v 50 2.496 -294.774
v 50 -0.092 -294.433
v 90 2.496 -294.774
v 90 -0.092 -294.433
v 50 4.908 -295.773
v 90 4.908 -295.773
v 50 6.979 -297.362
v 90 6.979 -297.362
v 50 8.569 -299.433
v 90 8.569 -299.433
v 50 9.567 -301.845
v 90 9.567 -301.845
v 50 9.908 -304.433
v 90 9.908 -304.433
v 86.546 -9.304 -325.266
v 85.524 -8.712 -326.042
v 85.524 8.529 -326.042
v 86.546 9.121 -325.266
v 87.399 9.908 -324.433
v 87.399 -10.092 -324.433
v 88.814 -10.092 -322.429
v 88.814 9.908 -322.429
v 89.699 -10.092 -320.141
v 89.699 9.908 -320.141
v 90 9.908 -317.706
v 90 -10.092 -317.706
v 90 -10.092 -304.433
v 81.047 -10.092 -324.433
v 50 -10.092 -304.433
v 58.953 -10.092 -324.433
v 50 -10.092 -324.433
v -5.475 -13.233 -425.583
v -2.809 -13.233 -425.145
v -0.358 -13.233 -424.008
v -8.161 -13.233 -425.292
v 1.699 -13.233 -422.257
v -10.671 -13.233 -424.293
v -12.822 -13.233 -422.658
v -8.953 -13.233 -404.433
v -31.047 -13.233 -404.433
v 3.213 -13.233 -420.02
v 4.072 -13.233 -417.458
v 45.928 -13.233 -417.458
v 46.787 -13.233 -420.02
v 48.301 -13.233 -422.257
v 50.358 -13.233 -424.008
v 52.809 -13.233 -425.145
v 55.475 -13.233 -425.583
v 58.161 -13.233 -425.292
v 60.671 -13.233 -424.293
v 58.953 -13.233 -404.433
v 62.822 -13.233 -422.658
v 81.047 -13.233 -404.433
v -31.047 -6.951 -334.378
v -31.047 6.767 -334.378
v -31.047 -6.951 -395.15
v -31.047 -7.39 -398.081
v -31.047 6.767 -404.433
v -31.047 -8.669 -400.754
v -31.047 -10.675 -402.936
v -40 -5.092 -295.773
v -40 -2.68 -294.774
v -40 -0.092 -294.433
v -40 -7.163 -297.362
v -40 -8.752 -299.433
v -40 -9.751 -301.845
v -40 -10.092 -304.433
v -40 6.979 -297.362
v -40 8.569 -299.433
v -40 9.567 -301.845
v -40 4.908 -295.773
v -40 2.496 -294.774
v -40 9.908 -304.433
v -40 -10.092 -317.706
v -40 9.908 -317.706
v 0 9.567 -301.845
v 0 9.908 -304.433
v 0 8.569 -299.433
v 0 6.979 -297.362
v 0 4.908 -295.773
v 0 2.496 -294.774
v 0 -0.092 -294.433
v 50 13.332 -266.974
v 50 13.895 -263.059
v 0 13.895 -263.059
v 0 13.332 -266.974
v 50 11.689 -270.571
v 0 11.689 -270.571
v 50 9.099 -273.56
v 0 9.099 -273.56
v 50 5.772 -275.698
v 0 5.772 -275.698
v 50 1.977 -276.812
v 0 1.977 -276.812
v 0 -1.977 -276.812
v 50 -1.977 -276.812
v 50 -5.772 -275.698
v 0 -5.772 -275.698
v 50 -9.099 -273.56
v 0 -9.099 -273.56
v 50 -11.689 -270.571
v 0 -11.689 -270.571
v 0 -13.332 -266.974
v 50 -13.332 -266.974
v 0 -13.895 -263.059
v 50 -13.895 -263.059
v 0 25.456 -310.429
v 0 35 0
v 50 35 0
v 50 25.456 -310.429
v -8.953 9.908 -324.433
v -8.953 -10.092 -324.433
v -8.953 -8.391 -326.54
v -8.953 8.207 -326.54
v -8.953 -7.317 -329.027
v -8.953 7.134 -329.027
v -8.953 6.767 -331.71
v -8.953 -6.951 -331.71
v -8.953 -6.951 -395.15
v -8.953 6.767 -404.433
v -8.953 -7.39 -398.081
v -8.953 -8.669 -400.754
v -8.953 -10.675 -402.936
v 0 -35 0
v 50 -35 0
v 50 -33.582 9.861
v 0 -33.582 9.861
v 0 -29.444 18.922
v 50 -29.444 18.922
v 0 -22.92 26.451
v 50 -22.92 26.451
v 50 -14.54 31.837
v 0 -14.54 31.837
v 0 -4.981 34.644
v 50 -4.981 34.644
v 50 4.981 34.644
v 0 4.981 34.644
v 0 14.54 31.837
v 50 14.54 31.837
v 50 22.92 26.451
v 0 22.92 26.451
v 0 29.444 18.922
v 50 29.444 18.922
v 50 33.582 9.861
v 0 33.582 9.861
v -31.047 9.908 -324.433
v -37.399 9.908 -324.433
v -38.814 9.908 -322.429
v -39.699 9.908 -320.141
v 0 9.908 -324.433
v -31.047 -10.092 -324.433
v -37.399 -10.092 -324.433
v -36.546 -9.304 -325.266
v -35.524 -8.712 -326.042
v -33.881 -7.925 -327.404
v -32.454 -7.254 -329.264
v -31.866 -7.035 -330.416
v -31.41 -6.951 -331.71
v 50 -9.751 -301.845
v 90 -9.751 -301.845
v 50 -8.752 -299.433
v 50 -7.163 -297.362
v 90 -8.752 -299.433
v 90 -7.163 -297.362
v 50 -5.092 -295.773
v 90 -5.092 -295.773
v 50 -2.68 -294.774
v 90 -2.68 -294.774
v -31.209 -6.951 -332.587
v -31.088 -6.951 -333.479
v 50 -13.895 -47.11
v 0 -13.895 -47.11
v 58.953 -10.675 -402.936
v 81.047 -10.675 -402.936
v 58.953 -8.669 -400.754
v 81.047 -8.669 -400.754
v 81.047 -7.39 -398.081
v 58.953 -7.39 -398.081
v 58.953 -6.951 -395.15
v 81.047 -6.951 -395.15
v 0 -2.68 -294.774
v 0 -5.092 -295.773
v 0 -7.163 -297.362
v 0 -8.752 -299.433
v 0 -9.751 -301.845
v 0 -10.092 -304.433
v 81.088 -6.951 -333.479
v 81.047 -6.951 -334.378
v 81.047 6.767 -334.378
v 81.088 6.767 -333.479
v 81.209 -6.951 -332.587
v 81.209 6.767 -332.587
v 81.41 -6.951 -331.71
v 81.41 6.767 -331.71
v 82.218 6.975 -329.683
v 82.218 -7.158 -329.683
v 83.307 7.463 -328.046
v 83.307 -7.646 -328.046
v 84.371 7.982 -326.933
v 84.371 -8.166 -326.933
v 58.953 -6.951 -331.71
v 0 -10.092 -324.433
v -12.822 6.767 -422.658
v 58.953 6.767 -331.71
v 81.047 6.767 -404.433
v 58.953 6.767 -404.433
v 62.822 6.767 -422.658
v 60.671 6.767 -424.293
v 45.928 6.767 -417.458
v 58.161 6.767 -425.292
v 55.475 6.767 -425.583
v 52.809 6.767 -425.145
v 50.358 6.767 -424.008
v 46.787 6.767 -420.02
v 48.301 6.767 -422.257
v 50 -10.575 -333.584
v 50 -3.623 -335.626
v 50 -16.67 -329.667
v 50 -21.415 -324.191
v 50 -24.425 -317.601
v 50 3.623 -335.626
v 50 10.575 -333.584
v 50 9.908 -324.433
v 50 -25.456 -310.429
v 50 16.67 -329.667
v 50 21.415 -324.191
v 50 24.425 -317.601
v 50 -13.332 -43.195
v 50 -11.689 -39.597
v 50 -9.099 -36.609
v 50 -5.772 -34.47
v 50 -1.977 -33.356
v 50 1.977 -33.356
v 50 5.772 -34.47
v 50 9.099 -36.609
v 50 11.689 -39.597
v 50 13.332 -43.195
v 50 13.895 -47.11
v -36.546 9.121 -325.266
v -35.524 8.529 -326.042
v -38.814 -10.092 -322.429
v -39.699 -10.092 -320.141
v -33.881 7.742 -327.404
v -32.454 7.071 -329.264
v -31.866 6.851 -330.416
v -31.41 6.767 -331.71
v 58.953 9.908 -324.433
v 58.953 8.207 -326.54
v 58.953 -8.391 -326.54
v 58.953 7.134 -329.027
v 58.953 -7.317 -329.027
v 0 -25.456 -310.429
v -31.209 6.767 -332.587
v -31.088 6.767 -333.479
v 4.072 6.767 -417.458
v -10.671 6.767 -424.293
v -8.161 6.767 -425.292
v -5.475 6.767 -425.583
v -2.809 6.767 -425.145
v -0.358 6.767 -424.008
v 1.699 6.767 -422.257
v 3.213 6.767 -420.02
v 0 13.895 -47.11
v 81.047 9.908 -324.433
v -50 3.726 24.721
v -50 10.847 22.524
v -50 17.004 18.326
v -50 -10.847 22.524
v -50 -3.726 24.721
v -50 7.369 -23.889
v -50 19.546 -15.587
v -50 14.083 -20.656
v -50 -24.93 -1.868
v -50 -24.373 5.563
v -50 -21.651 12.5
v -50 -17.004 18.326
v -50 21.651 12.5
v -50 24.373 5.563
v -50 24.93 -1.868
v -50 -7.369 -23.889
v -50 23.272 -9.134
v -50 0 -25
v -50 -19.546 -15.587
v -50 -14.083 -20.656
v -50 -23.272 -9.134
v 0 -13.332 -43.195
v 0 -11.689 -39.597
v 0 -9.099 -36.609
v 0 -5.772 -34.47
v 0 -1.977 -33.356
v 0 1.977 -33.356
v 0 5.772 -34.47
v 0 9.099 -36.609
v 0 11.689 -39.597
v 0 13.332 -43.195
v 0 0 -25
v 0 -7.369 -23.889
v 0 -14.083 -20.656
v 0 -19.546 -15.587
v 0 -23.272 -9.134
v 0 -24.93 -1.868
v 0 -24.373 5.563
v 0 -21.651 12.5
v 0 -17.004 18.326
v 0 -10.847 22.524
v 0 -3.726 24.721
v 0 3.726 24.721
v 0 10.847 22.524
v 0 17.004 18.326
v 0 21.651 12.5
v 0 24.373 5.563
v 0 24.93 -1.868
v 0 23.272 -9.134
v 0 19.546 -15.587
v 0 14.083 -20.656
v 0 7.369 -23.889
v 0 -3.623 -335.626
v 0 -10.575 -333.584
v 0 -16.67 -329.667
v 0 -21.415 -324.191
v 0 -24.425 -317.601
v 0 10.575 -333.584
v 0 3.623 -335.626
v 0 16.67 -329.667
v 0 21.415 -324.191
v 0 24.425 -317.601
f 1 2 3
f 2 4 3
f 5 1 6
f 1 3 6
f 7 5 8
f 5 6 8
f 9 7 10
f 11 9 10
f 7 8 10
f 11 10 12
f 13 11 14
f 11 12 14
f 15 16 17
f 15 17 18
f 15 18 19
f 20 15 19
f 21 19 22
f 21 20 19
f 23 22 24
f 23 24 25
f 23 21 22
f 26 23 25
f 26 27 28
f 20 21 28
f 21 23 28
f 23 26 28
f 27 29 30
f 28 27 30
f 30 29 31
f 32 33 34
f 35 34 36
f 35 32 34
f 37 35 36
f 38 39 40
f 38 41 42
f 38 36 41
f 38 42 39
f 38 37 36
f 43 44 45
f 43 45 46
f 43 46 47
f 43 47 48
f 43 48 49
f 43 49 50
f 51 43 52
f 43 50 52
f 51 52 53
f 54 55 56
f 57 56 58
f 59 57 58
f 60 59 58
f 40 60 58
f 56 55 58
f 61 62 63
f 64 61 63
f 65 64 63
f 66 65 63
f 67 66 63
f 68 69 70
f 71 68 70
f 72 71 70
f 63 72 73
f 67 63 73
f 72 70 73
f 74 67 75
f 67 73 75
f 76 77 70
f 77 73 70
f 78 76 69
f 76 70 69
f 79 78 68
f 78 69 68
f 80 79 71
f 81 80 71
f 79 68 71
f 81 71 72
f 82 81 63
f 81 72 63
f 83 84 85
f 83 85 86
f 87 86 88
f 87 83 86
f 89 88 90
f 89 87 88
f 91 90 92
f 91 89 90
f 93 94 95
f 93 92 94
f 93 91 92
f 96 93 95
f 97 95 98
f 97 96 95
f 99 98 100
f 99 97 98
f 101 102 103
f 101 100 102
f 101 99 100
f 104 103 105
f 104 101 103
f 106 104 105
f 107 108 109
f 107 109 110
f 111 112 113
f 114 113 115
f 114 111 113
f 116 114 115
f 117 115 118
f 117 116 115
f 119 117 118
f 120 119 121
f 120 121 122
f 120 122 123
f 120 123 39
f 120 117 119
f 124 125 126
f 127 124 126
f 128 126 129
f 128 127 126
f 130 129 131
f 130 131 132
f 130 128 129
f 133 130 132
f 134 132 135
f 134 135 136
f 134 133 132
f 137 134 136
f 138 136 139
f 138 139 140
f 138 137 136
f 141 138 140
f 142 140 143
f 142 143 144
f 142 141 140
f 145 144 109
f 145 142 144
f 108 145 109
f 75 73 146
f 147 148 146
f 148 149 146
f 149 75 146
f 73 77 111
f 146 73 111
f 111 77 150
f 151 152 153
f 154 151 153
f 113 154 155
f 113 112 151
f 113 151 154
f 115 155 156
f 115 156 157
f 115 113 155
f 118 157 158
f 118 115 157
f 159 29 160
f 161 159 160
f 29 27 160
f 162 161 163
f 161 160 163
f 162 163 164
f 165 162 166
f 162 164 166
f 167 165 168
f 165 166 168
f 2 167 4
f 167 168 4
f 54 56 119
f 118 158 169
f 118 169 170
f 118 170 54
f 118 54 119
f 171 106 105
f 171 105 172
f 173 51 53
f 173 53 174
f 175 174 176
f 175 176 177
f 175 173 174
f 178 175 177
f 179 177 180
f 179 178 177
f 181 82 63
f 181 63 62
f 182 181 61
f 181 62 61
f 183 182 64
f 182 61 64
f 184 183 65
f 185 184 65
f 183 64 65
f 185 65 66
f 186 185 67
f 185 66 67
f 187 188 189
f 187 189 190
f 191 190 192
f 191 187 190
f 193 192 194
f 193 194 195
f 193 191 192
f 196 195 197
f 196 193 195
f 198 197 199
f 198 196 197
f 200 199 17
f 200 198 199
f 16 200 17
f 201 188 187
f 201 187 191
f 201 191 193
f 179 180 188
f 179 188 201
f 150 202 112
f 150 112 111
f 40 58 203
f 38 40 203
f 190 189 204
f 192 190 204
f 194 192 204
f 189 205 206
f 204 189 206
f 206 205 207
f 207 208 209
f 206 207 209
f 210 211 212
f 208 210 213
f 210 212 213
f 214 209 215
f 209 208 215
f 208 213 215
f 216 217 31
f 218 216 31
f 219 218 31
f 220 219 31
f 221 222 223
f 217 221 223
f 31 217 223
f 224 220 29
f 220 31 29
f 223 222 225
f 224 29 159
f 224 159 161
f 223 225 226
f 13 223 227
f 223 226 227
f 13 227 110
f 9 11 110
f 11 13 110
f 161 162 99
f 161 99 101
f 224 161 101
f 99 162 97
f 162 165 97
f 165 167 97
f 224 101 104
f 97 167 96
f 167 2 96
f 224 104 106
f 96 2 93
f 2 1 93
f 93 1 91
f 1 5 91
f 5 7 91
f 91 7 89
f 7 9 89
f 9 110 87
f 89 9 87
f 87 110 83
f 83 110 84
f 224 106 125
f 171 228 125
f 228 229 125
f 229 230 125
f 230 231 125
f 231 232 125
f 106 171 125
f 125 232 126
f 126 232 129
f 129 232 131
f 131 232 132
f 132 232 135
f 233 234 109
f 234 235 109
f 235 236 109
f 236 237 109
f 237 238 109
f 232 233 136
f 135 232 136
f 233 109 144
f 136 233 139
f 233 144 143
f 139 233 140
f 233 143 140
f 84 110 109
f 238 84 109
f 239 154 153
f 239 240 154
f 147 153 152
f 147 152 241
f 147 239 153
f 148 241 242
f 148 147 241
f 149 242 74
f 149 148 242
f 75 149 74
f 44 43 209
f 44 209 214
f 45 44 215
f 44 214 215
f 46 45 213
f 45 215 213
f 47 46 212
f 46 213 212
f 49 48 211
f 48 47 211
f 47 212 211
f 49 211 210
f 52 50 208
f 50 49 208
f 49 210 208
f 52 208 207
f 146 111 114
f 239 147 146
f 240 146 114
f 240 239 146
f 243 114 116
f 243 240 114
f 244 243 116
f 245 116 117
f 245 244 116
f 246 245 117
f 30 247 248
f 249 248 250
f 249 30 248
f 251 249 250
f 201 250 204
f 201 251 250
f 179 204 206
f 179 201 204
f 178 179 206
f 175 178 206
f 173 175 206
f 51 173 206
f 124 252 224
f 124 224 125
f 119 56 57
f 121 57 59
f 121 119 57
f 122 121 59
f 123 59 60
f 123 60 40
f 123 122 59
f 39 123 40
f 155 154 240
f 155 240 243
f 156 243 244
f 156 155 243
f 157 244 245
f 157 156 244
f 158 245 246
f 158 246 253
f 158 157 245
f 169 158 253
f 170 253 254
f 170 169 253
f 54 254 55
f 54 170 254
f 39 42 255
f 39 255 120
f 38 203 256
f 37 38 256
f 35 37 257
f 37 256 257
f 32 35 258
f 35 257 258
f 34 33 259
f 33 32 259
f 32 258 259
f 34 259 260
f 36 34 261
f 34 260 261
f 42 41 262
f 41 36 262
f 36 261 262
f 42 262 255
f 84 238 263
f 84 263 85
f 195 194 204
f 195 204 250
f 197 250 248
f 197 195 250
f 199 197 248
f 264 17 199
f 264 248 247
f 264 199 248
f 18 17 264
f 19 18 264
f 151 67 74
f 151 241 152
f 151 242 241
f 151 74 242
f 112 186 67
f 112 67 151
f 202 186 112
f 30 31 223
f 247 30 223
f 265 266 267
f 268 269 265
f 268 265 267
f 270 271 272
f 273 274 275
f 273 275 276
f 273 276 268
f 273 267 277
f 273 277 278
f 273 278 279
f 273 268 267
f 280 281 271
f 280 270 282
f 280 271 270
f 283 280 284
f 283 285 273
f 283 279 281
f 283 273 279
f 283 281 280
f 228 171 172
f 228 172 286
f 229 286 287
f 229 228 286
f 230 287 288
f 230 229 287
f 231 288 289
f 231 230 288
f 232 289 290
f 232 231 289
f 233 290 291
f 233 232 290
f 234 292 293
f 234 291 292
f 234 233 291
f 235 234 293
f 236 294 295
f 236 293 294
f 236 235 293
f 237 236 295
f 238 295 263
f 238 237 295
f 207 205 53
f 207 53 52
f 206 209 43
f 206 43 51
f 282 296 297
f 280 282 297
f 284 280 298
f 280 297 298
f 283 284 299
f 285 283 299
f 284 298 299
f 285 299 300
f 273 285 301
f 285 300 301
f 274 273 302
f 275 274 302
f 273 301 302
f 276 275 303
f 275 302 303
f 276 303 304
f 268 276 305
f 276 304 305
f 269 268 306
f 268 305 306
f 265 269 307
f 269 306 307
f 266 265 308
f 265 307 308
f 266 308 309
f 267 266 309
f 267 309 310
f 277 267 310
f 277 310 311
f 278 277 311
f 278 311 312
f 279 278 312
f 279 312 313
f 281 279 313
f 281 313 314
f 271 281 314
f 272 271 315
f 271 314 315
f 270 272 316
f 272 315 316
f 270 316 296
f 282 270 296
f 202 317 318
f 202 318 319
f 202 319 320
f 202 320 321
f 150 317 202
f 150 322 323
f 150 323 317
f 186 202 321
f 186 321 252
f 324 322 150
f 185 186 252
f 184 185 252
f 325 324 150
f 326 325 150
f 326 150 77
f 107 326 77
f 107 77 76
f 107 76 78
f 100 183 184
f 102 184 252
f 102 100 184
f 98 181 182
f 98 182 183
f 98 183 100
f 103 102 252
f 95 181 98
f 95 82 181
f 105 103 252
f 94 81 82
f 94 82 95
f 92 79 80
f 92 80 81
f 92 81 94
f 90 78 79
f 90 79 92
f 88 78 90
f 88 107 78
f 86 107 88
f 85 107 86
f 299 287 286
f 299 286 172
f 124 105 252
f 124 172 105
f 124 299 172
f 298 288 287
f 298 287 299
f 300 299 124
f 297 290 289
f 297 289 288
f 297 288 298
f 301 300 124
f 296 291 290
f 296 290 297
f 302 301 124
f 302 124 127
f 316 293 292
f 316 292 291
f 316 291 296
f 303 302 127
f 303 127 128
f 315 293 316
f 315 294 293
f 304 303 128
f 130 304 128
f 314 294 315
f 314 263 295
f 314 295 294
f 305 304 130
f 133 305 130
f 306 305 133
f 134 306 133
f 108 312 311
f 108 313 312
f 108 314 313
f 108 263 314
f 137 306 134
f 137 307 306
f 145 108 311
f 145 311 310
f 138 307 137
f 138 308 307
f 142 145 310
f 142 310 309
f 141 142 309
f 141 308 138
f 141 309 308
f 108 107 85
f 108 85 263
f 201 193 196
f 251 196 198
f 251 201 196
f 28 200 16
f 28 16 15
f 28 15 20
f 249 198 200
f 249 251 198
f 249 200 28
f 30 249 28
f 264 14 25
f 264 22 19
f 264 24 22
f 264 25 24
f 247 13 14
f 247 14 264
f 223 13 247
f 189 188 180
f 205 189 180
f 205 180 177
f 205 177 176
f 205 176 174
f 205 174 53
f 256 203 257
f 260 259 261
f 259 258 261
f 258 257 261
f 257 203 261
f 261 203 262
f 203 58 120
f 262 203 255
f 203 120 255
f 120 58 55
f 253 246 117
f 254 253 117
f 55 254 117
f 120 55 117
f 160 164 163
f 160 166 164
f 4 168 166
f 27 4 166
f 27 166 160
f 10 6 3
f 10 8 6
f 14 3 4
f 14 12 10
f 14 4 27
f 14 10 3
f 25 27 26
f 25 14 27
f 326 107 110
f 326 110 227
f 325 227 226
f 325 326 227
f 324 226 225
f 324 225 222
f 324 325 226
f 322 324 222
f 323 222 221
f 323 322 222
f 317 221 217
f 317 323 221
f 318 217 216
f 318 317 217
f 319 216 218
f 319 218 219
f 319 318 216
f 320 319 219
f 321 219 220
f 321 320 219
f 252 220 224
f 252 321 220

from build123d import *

# Parameters (mm, degrees)
Y_KSEKLIK_EKSTR_ZYON1_DEPTH = 50
IZIM2_R                     = 25
Y_KSEKLIK_EKSTR_ZYON2_DEPTH = 50
IZIM3_W                     = 30
IZIM3_H                     = 20
Y_KSEKLIK_EKSTR_ZYON3_DEPTH = 40
IZIM4_W                     = 22.094425692
IZIM4_H                     = 13.717833442
Y_KSEKLIK_EKSTR_ZYON4_DEPTH = 80
Y_KSEKLIK_EKSTR_ZYON5_DEPTH = 20
RADYUS1_R                   = 10
RADYUS3_R                   = 10
RADYUS4_R                   = 10
RADYUS8_R                   = 10
RADYUS9_R                   = 10
RADYUS1_OF_AYNALAMA2_R      = 10
RADYUS3_OF_AYNALAMA2_R      = 10
RADYUS4_OF_AYNALAMA2_R      = 10
RADYUS8_OF_AYNALAMA2_R      = 10
RADYUS10_R                  = 10
KES_EKSTR_ZYON1_DEPTH       = 60


# Some blends are built 0.0001 mm under size
with BuildPart() as part:
    # Çizim1 → Yükseklik-Ekstrüzyon1 (new body)
    with BuildSketch(Plane(origin=(0, 0, 0), x_dir=(0, 0, -1), z_dir=(1, 0, 0))):
        with BuildLine():
            Line((0, 35), (310.428755788, 25.455915403))
            ThreePointArc((310.428755788, 25.455915403), (335.884671191, 0), (310.428755788, -25.455915403))
            Line((310.428755788, -25.455915403), (0, -35))
            ThreePointArc((0, -35), (-35, 0), (0, 35))
        make_face()
    extrude(amount=Y_KSEKLIK_EKSTR_ZYON1_DEPTH)

    # Çizim2 → Yükseklik-Ekstrüzyon2 (add)
    with BuildSketch(Plane.ZY):
        with Locations(Location((0, 0, 0), (0, 0, 180))):
            Circle(IZIM2_R)
    extrude(amount=Y_KSEKLIK_EKSTR_ZYON2_DEPTH)

    # Çizim3 → Yükseklik-Ekstrüzyon3 (add)
    with BuildSketch(Plane(origin=(50, 0, 0), x_dir=(0, 0, -1), z_dir=(1, 0, 0))):
        with Locations((309.433006003, -0.091766489)):
            Rectangle(IZIM3_W, IZIM3_H)
    y_kseklik_ekstr_zyon3 = extrude(amount=Y_KSEKLIK_EKSTR_ZYON3_DEPTH)

    # Çizim4 → Yükseklik-Ekstrüzyon4 (add)
    with BuildSketch(Plane(origin=(0, 0, -324.433006003), x_dir=(-1, 0, 0), z_dir=(0, 0, -1))):
        with Locations((-70, -0.091766489)):
            Rectangle(IZIM4_W, IZIM4_H)
    y_kseklik_ekstr_zyon4 = extrude(amount=Y_KSEKLIK_EKSTR_ZYON4_DEPTH)

    # Çizim5 → Yükseklik-Ekstrüzyon5 (add)
    with BuildSketch(Plane(origin=(0, 6.767150232, 0), x_dir=(1, 0, 0), z_dir=(0, 1, 0))):
        Polygon((81.047212846, 404.433006003), (45.927609997, 439.552608852), (45.927609997, 417.45818316), (58.952787154, 404.433006003), align=None)
    y_kseklik_ekstr_zyon5 = extrude(amount=-Y_KSEKLIK_EKSTR_ZYON5_DEPTH)

    # Radyus1
    # the kernel refuses this fillet: 10 mm, written as the material it adds along each edge
    with BuildSketch(Plane(origin=(81.047212846, 6.767150232, -324.433006003), x_dir=(0, 1, 0), z_dir=(-1, 0, 0)), Plane(origin=(58.952787154, -6.95068321, -324.433006003), x_dir=(0, -1, 0), z_dir=(1, 0, 0))) as radyus1_piece_1:
        with BuildLine():
            CenterArc((10, 7.277036582), RADYUS1_R, 180, 46.694227485)
            Line((0, 7.277036582), (-0.2, 7.277036582))
            Line((-0.2, 7.277036582), (-0.2, 0))
            Line((-0.2, 0), (0, -0.2))
            ThreePointArc((0, -0.2), (1.570541639, -0.2), (3.003904945, -0.145540732))
            Line((3.003904945, -0.145540732), (3.141083279, 0))
        make_face()
    extrude(amount=22.094425692)
    with BuildSketch(Plane(origin=(81.047212846, -6.95068321, -324.433006003), x_dir=(1, 0, 0), z_dir=(0, 1, 0))) as radyus1_piece_2:
        with BuildLine():
            CenterArc((10, 9.945016101), RADYUS1_R, 180, 83.988891185)
            Line((0, 9.945016101), (-0.2, 9.945016101))
            Line((-0.2, 9.945016101), (-0.2, 0))
            Line((-0.2, 0), (0, -0.2))
            ThreePointArc((0, -0.2), (4.476393577, -0.2), (8.931842897, -0.198900322))
            Line((8.931842897, -0.198900322), (8.952787154, 0))
        make_face()
    extrude(amount=13.717833442)
    with BuildSketch(Plane(origin=(81.047212846, -6.95068321, -324.433006003), x_dir=(1, 0, 0), z_dir=(0, 1, 0))) as radyus1_piece_3a_section:
        with BuildLine():
            CenterArc((10, 9.945016101), RADYUS1_R, 180, 83.988891185)
            Line((0, 9.945016101), (-0.2, 9.945016101))
            Line((-0.2, 9.945016101), (-0.2, 0))
            Line((-0.2, 0), (0, -0.2))
            ThreePointArc((0, -0.2), (4.476393577, -0.2), (8.931842897, -0.198900322))
            Line((8.931842897, -0.198900322), (8.952787154, 0))
        make_face()
    radyus1_piece_3a = extrude(amount=38.580373695, mode=Mode.PRIVATE)
    radyus1_piece_3a = split(radyus1_piece_3a, bisect_by=Plane(origin=(83.202696921, 6.767150232, -326.71552739), z_dir=(0, 1, 0)), keep=Keep.TOP, mode=Mode.PRIVATE)
    with BuildSketch(Plane(origin=(99.2398043, 6.767150232, -324.433006003), x_dir=(0, 1, 0), z_dir=(-1, 0, 0))) as radyus1_piece_3b_section:
        with BuildLine():
            CenterArc((10, 7.277036582), RADYUS1_R, 180, 46.694227485)
            Line((0, 7.277036582), (-0.2, 7.277036582))
            Line((-0.2, 7.277036582), (-0.2, 0))
            Line((-0.2, 0), (0, -0.2))
            ThreePointArc((0, -0.2), (1.570541639, -0.2), (3.003904945, -0.145540732))
            Line((3.003904945, -0.145540732), (3.141083279, 0))
        make_face()
    radyus1_piece_3b = extrude(amount=40.287017146, mode=Mode.PRIVATE)
    radyus1_piece_3b = split(radyus1_piece_3b, bisect_by=Plane(origin=(81.047212846, 7.54925635, -326.367172989), z_dir=(1, 0, 0)), keep=Keep.TOP, mode=Mode.PRIVATE)
    radyus1_piece_3 = radyus1_piece_3a & radyus1_piece_3b
    add(radyus1_piece_3)
    with BuildSketch(Plane(origin=(81.047212846, -31.813223463, -324.433006003), x_dir=(1, 0, 0), z_dir=(0, 1, 0))) as radyus1_piece_4a_section:
        with BuildLine():
            CenterArc((10, 9.945016101), RADYUS1_R, 180, 83.988891185)
            Line((0, 9.945016101), (-0.2, 9.945016101))
            Line((-0.2, 9.945016101), (-0.2, 0))
            Line((-0.2, 0), (0, -0.2))
            ThreePointArc((0, -0.2), (4.476393577, -0.2), (8.931842897, -0.198900322))
            Line((8.931842897, -0.198900322), (8.952787154, 0))
        make_face()
    radyus1_piece_4a = extrude(amount=38.580373695, mode=Mode.PRIVATE)
    radyus1_piece_4a = split(radyus1_piece_4a, bisect_by=Plane(origin=(83.202696921, -6.95068321, -326.71552739), z_dir=(0, -1, 0)), keep=Keep.TOP, mode=Mode.PRIVATE)
    with BuildSketch(Plane(origin=(58.952787154, -6.95068321, -324.433006003), x_dir=(0, -1, 0), z_dir=(1, 0, 0))) as radyus1_piece_4b_section:
        with BuildLine():
            CenterArc((10, 7.277036582), RADYUS1_R, 180, 46.694227485)
            Line((0, 7.277036582), (-0.2, 7.277036582))
            Line((-0.2, 7.277036582), (-0.2, 0))
            Line((-0.2, 0), (0, -0.2))
            ThreePointArc((0, -0.2), (1.570541639, -0.2), (3.003904945, -0.145540732))
            Line((3.003904945, -0.145540732), (3.141083279, 0))
        make_face()
    radyus1_piece_4b = extrude(amount=40.287017146, mode=Mode.PRIVATE)
    radyus1_piece_4b = split(radyus1_piece_4b, bisect_by=Plane(origin=(81.047212846, -7.732789327, -326.367172989), z_dir=(1, 0, 0)), keep=Keep.TOP, mode=Mode.PRIVATE)
    radyus1_piece_4 = radyus1_piece_4a & radyus1_piece_4b
    add(radyus1_piece_4)

    # Radyus3
    radyus3_edges = [part.edges().sort_by_distance(p)[0] for p in [
        (90, -0.091766489, -324.433006003),
    ]]
    fillet(radyus3_edges, radius=RADYUS3_R)

    # Radyus4
    radyus4_edges = [part.edges().sort_by_distance(p)[0] for p in [
        (70, -10.091766489, -294.433006003),
        (70, 9.908233511, -294.433006003),
    ]]
    fillet(radyus4_edges, radius=RADYUS4_R - 0.0001)  # a hair under: the kernel refuses the full size

    # Radyus8
    # the kernel refuses this fillet: 10 mm, written as the material it takes off along each edge
    with BuildSketch(Plane(origin=(45.927609997, 66.498077734, -439.552608852), x_dir=(0, 0, 1), z_dir=(0, -1, 0))) as radyus8_piece_1:
        with BuildLine():
            CenterArc((23.965525365, -9.823389741), RADYUS8_R, 100.784173019, 124.215826981)
            Line((16.894457553, -16.894457553), (16.753036197, -17.03587891))
            Line((16.753036197, -17.03587891), (-0.141421356, -0.141421356))
            Line((-0.141421356, -0.141421356), (0, 0.2))
            ThreePointArc((0, 0.2), (11.047212846, 0.2), (22.057003698, 0.196467795))
            Line((22.057003698, 0.196467795), (22.094425692, 0))
        make_face()
    extrude(amount=139.461855004, mode=Mode.SUBTRACT)

    # Radyus9
    # the kernel refuses this fillet: 10 mm, written as the material it adds along each edge
    with BuildSketch(Plane(origin=(58.952787154, -6.95068321, -404.433006003), x_dir=(0, 0, 1), z_dir=(1, 0, 0))) as radyus9_piece_1_section:
        with BuildLine():
            CenterArc((9.283195274, 10), RADYUS9_R, 201.825642852, 68.174357148)
            Line((0, 6.282166558), (-0.185663905, 6.207809889))
            ThreePointArc((-0.185663905, 6.207809889), (-0.2, 3.141083279), (-0.2, 0))
            Line((-0.2, 0), (0, -0.2))
            Line((0, -0.2), (9.283195274, -0.2))
            Line((9.283195274, -0.2), (9.283195274, 0))
        make_face()
    radyus9_piece_1 = extrude(amount=22.094425692, mode=Mode.PRIVATE)
    radyus9_piece_1 = split(radyus9_piece_1, bisect_by=Plane(origin=(62.026503816, -7.778070803, -401.359289341), z_dir=(-0.707106781186545, 0, 0.70710678118655)), keep=Keep.TOP, mode=Mode.PRIVATE)
    add(radyus9_piece_1)
    with BuildSketch(Plane(origin=(35.744798969, -6.95068321, -404.433006003), x_dir=(0, 0, 1), z_dir=(1, 0, 0))) as radyus9_piece_2_section:
        with BuildLine():
            CenterArc((9.283195274, 10), RADYUS9_R, 201.825642852, 68.174357148)
            Line((0, 6.282166558), (-0.185663905, 6.207809889))
            ThreePointArc((-0.185663905, 6.207809889), (-0.2, 3.141083279), (-0.2, 0))
            Line((-0.2, 0), (0, -0.2))
            Line((0, -0.2), (9.283195274, -0.2))
            Line((9.283195274, -0.2), (9.283195274, 0))
        make_face()
    radyus9_piece_2 = extrude(amount=45.302413877, mode=Mode.PRIVATE)
    radyus9_piece_2 = split(radyus9_piece_2, bisect_by=Plane(origin=(58.952787154, -9.958064826, -404.564448842), z_dir=(-1, 0, 0)), keep=Keep.TOP, mode=Mode.PRIVATE)
    radyus9_piece_2 = split(radyus9_piece_2, bisect_by=Plane(origin=(58.854205025, -9.958064826, -404.531588132), z_dir=(0.707106781186545, 0, -0.70710678118655)), keep=Keep.TOP, mode=Mode.PRIVATE)
    add(radyus9_piece_2)
    with BuildSketch(Plane(origin=(58.952787154, -6.95068321, -404.433006003), x_dir=(0, 0, 1), z_dir=(1, 0, 0))) as radyus9_piece_3_section:
        with BuildLine():
            CenterArc((9.283195274, 10), RADYUS9_R, 201.825642852, 68.174357148)
            Line((0, 6.282166558), (-0.185663905, 6.207809889))
            ThreePointArc((-0.185663905, 6.207809889), (-0.2, 3.141083279), (-0.2, 0))
            Line((-0.2, 0), (0, -0.2))
            Line((0, -0.2), (9.283195274, -0.2))
            Line((9.283195274, -0.2), (9.283195274, 0))
        make_face()
    radyus9_piece_3 = extrude(amount=22.094425692, mode=Mode.PRIVATE)
    radyus9_piece_3 = split(radyus9_piece_3, bisect_by=Plane(origin=(66.003516805, -8.660917464, -397.382276353), z_dir=(0.707106781186545, 0, -0.70710678118655)), keep=Keep.TOP, mode=Mode.PRIVATE)
    radyus9_piece_3 = split(radyus9_piece_3, bisect_by=Plane(origin=(77.050729651, -8.660917464, -408.429489198), z_dir=(-0.7071067811865436, 0, 0.7071067811865515)), keep=Keep.TOP, mode=Mode.PRIVATE)
    add(radyus9_piece_3)

    # Aynalama2: Yükseklik-Ekstrüzyon3, Yükseklik-Ekstrüzyon4, Yükseklik-Ekstrüzyon5 across plane
    add(y_kseklik_ekstr_zyon3.mirror(Plane(origin=(25, 0, 0), x_dir=(0, 0, 1), z_dir=(1, 0, 0))))
    add(y_kseklik_ekstr_zyon4.mirror(Plane(origin=(25, 0, 0), x_dir=(0, 0, 1), z_dir=(1, 0, 0))))
    add(y_kseklik_ekstr_zyon5.mirror(Plane(origin=(25, 0, 0), x_dir=(0, 0, 1), z_dir=(1, 0, 0))))

    # Radyus1 of Aynalama2
    # the kernel refuses this fillet: 10 mm, written as the material it adds along each edge
    with BuildSketch(Plane(origin=(-31.047212846, 6.767150232, -324.433006003), x_dir=(0, 1, 0), z_dir=(1, 0, 0)), Plane(origin=(-8.952787154, -6.95068321, -324.433006003), x_dir=(0, -1, 0), z_dir=(-1, 0, 0))) as radyus1_of_aynalama2_piece_1:
        with BuildLine():
            CenterArc((10, -7.277036582), RADYUS1_OF_AYNALAMA2_R, 133.305772515, 46.694227485)
            Line((0, -7.277036582), (-0.2, -7.277036582))
            Line((-0.2, -7.277036582), (-0.2, 0))
            Line((-0.2, 0), (0, 0.2))
            ThreePointArc((0, 0.2), (1.570541639, 0.2), (3.003904945, 0.145540732))
            Line((3.003904945, 0.145540732), (3.141083279, 0))
        make_face()
    extrude(amount=22.094425692)
    with BuildSketch(Plane(origin=(-31.047212846, -6.95068321, -324.433006003), x_dir=(-1, 0, 0), z_dir=(0, 1, 0))) as radyus1_of_aynalama2_piece_2:
        with BuildLine():
            CenterArc((10, -9.945016101), RADYUS1_OF_AYNALAMA2_R, 96.011108815, 83.988891185)
            Line((0, -9.945016101), (-0.2, -9.945016101))
            Line((-0.2, -9.945016101), (-0.2, 0))
            Line((-0.2, 0), (0, 0.2))
            ThreePointArc((0, 0.2), (4.476393577, 0.2), (8.931842897, 0.198900322))
            Line((8.931842897, 0.198900322), (8.952787154, 0))
        make_face()
    extrude(amount=13.717833442)
    with BuildSketch(Plane(origin=(-31.047212846, -6.95068321, -324.433006003), x_dir=(-1, 0, 0), z_dir=(0, 1, 0))) as radyus1_of_aynalama2_piece_3a_section:
        with BuildLine():
            CenterArc((10, -9.945016101), RADYUS1_OF_AYNALAMA2_R, 96.011108815, 83.988891185)
            Line((0, -9.945016101), (-0.2, -9.945016101))
            Line((-0.2, -9.945016101), (-0.2, 0))
            Line((-0.2, 0), (0, 0.2))
            ThreePointArc((0, 0.2), (4.476393577, 0.2), (8.931842897, 0.198900322))
            Line((8.931842897, 0.198900322), (8.952787154, 0))
        make_face()
    radyus1_of_aynalama2_piece_3a = extrude(amount=38.580373695, mode=Mode.PRIVATE)
    radyus1_of_aynalama2_piece_3a = split(radyus1_of_aynalama2_piece_3a, bisect_by=Plane(origin=(-33.202696921, 6.767150232, -326.71552739), z_dir=(0, 1, 0)), keep=Keep.TOP, mode=Mode.PRIVATE)
    with BuildSketch(Plane(origin=(-49.2398043, 6.767150232, -324.433006003), x_dir=(0, 1, 0), z_dir=(1, 0, 0))) as radyus1_of_aynalama2_piece_3b_section:
        with BuildLine():
            CenterArc((10, -7.277036582), RADYUS1_OF_AYNALAMA2_R, 133.305772515, 46.694227485)
            Line((0, -7.277036582), (-0.2, -7.277036582))
            Line((-0.2, -7.277036582), (-0.2, 0))
            Line((-0.2, 0), (0, 0.2))
            ThreePointArc((0, 0.2), (1.570541639, 0.2), (3.003904945, 0.145540732))
            Line((3.003904945, 0.145540732), (3.141083279, 0))
        make_face()
    radyus1_of_aynalama2_piece_3b = extrude(amount=40.287017146, mode=Mode.PRIVATE)
    radyus1_of_aynalama2_piece_3b = split(radyus1_of_aynalama2_piece_3b, bisect_by=Plane(origin=(-31.047212846, 7.54925635, -326.367172989), z_dir=(-1, 0, 0)), keep=Keep.TOP, mode=Mode.PRIVATE)
    radyus1_of_aynalama2_piece_3 = radyus1_of_aynalama2_piece_3a & radyus1_of_aynalama2_piece_3b
    add(radyus1_of_aynalama2_piece_3)
    with BuildSketch(Plane(origin=(-31.047212846, -31.813223463, -324.433006003), x_dir=(-1, 0, 0), z_dir=(0, 1, 0))) as radyus1_of_aynalama2_piece_4a_section:
        with BuildLine():
            CenterArc((10, -9.945016101), RADYUS1_OF_AYNALAMA2_R, 96.011108815, 83.988891185)
            Line((0, -9.945016101), (-0.2, -9.945016101))
            Line((-0.2, -9.945016101), (-0.2, 0))
            Line((-0.2, 0), (0, 0.2))
            ThreePointArc((0, 0.2), (4.476393577, 0.2), (8.931842897, 0.198900322))
            Line((8.931842897, 0.198900322), (8.952787154, 0))
        make_face()
    radyus1_of_aynalama2_piece_4a = extrude(amount=38.580373695, mode=Mode.PRIVATE)
    radyus1_of_aynalama2_piece_4a = split(radyus1_of_aynalama2_piece_4a, bisect_by=Plane(origin=(-33.202696921, -6.95068321, -326.71552739), z_dir=(0, -1, 0)), keep=Keep.TOP, mode=Mode.PRIVATE)
    with BuildSketch(Plane(origin=(-8.952787154, -6.95068321, -324.433006003), x_dir=(0, -1, 0), z_dir=(-1, 0, 0))) as radyus1_of_aynalama2_piece_4b_section:
        with BuildLine():
            CenterArc((10, -7.277036582), RADYUS1_OF_AYNALAMA2_R, 133.305772515, 46.694227485)
            Line((0, -7.277036582), (-0.2, -7.277036582))
            Line((-0.2, -7.277036582), (-0.2, 0))
            Line((-0.2, 0), (0, 0.2))
            ThreePointArc((0, 0.2), (1.570541639, 0.2), (3.003904945, 0.145540732))
            Line((3.003904945, 0.145540732), (3.141083279, 0))
        make_face()
    radyus1_of_aynalama2_piece_4b = extrude(amount=40.287017146, mode=Mode.PRIVATE)
    radyus1_of_aynalama2_piece_4b = split(radyus1_of_aynalama2_piece_4b, bisect_by=Plane(origin=(-31.047212846, -7.732789327, -326.367172989), z_dir=(-1, 0, 0)), keep=Keep.TOP, mode=Mode.PRIVATE)
    radyus1_of_aynalama2_piece_4 = radyus1_of_aynalama2_piece_4a & radyus1_of_aynalama2_piece_4b
    add(radyus1_of_aynalama2_piece_4)

    # Radyus3 of Aynalama2
    radyus3_of_aynalama2_edges = [part.edges().sort_by_distance(p)[0] for p in [
        (-40, -0.091766489, -324.433006003),
    ]]
    fillet(radyus3_of_aynalama2_edges, radius=RADYUS3_OF_AYNALAMA2_R)

    # Radyus4 of Aynalama2
    radyus4_of_aynalama2_edges = [part.edges().sort_by_distance(p)[0] for p in [
        (-20, -10.091766489, -294.433006003),
        (-20, 9.908233511, -294.433006003),
    ]]
    fillet(radyus4_of_aynalama2_edges, radius=RADYUS4_OF_AYNALAMA2_R - 0.0001)  # a hair under: the kernel refuses the full size

    # Radyus8 of Aynalama2
    # the kernel refuses this fillet: 10 mm, written as the material it takes off along each edge
    with BuildSketch(Plane(origin=(4.072390003, 66.498077734, -439.552608852), x_dir=(-0.7071067811865518, 0, 0.7071067811865432), z_dir=(0, -1, 0))) as radyus8_of_aynalama2_piece_1:
        with BuildLine():
            CenterArc((23.892371001, -10), RADYUS8_OF_AYNALAMA2_R, 90, 124.215826981)
            Line((15.623118233, -15.623118233), (15.457733178, -15.735580598))
            ThreePointArc((15.457733178, -15.735580598), (7.67013776, -7.952980473), (-0.141421356, -0.141421356))
            Line((-0.141421356, -0.141421356), (0, 0.2))
            Line((0, 0.2), (23.892371001, 0.2))
            Line((23.892371001, 0.2), (23.892371001, 0))
        make_face()
    extrude(amount=139.461855004, mode=Mode.SUBTRACT)

    # Radyus10
    # the kernel refuses this fillet: 10 mm, written as the material it adds along each edge
    with BuildSketch(Plane(origin=(-8.952787154, -6.95068321, -404.433006003), x_dir=(0, 0, 1), z_dir=(-1, 0, 0))) as radyus10_piece_1_section:
        with BuildLine():
            CenterArc((9.283195274, -10), RADYUS10_R, 90, 68.174357148)
            Line((0, -6.282166558), (-0.185663905, -6.207809889))
            ThreePointArc((-0.185663905, -6.207809889), (-0.2, -3.141083279), (-0.2, 0))
            Line((-0.2, 0), (0, 0.2))
            Line((0, 0.2), (9.283195274, 0.2))
            Line((9.283195274, 0.2), (9.283195274, 0))
        make_face()
    radyus10_piece_1 = extrude(amount=22.094425692, mode=Mode.PRIVATE)
    radyus10_piece_1 = split(radyus10_piece_1, bisect_by=Plane(origin=(-12.026503816, -7.778070803, -401.359289341), z_dir=(0.707106781186545, 0, 0.70710678118655)), keep=Keep.TOP, mode=Mode.PRIVATE)
    add(radyus10_piece_1)
    with BuildSketch(Plane(origin=(14.255201031, -6.95068321, -404.433006003), x_dir=(0, 0, 1), z_dir=(-1, 0, 0))) as radyus10_piece_2_section:
        with BuildLine():
            CenterArc((9.283195274, -10), RADYUS10_R, 90, 68.174357148)
            Line((0, -6.282166558), (-0.185663905, -6.207809889))
            ThreePointArc((-0.185663905, -6.207809889), (-0.2, -3.141083279), (-0.2, 0))
            Line((-0.2, 0), (0, 0.2))
            Line((0, 0.2), (9.283195274, 0.2))
            Line((9.283195274, 0.2), (9.283195274, 0))
        make_face()
    radyus10_piece_2 = extrude(amount=45.302413877, mode=Mode.PRIVATE)
    radyus10_piece_2 = split(radyus10_piece_2, bisect_by=Plane(origin=(-8.952787154, -9.958064826, -404.564448842), z_dir=(1, 0, 0)), keep=Keep.TOP, mode=Mode.PRIVATE)
    radyus10_piece_2 = split(radyus10_piece_2, bisect_by=Plane(origin=(-8.854205025, -9.958064826, -404.531588132), z_dir=(-0.707106781186545, 0, -0.70710678118655)), keep=Keep.TOP, mode=Mode.PRIVATE)
    add(radyus10_piece_2)
    with BuildSketch(Plane(origin=(-8.952787154, -6.95068321, -404.433006003), x_dir=(0, 0, 1), z_dir=(-1, 0, 0))) as radyus10_piece_3_section:
        with BuildLine():
            CenterArc((9.283195274, -10), RADYUS10_R, 90, 68.174357148)
            Line((0, -6.282166558), (-0.185663905, -6.207809889))
            ThreePointArc((-0.185663905, -6.207809889), (-0.2, -3.141083279), (-0.2, 0))
            Line((-0.2, 0), (0, 0.2))
            Line((0, 0.2), (9.283195274, 0.2))
            Line((9.283195274, 0.2), (9.283195274, 0))
        make_face()
    radyus10_piece_3 = extrude(amount=22.094425692, mode=Mode.PRIVATE)
    radyus10_piece_3 = split(radyus10_piece_3, bisect_by=Plane(origin=(-16.003516805, -8.660917464, -397.382276353), z_dir=(-0.707106781186545, 0, -0.70710678118655)), keep=Keep.TOP, mode=Mode.PRIVATE)
    radyus10_piece_3 = split(radyus10_piece_3, bisect_by=Plane(origin=(-27.050729651, -8.660917464, -408.429489198), z_dir=(0.7071067811865436, 0, 0.7071067811865515)), keep=Keep.TOP, mode=Mode.PRIVATE)
    add(radyus10_piece_3)

    # Çizim6 → Kes-Ekstrüzyon1 (cut)
    with BuildSketch(Plane(origin=(50, 0, 0), x_dir=(0, 0, -1), z_dir=(1, 0, 0))):
        with BuildLine():
            Line((47.109572829, 13.894766115), (263.058999376, 13.894766115))
            ThreePointArc((263.058999376, 13.894766115), (276.953765491, 0), (263.058999376, -13.894766115))
            Line((263.058999376, -13.894766115), (47.109572829, -13.894766115))
            ThreePointArc((47.109572829, -13.894766115), (33.214806714, 0), (47.109572829, 13.894766115))
        make_face()
    extrude(amount=-KES_EKSTR_ZYON1_DEPTH, mode=Mode.SUBTRACT)


solid = part.part
